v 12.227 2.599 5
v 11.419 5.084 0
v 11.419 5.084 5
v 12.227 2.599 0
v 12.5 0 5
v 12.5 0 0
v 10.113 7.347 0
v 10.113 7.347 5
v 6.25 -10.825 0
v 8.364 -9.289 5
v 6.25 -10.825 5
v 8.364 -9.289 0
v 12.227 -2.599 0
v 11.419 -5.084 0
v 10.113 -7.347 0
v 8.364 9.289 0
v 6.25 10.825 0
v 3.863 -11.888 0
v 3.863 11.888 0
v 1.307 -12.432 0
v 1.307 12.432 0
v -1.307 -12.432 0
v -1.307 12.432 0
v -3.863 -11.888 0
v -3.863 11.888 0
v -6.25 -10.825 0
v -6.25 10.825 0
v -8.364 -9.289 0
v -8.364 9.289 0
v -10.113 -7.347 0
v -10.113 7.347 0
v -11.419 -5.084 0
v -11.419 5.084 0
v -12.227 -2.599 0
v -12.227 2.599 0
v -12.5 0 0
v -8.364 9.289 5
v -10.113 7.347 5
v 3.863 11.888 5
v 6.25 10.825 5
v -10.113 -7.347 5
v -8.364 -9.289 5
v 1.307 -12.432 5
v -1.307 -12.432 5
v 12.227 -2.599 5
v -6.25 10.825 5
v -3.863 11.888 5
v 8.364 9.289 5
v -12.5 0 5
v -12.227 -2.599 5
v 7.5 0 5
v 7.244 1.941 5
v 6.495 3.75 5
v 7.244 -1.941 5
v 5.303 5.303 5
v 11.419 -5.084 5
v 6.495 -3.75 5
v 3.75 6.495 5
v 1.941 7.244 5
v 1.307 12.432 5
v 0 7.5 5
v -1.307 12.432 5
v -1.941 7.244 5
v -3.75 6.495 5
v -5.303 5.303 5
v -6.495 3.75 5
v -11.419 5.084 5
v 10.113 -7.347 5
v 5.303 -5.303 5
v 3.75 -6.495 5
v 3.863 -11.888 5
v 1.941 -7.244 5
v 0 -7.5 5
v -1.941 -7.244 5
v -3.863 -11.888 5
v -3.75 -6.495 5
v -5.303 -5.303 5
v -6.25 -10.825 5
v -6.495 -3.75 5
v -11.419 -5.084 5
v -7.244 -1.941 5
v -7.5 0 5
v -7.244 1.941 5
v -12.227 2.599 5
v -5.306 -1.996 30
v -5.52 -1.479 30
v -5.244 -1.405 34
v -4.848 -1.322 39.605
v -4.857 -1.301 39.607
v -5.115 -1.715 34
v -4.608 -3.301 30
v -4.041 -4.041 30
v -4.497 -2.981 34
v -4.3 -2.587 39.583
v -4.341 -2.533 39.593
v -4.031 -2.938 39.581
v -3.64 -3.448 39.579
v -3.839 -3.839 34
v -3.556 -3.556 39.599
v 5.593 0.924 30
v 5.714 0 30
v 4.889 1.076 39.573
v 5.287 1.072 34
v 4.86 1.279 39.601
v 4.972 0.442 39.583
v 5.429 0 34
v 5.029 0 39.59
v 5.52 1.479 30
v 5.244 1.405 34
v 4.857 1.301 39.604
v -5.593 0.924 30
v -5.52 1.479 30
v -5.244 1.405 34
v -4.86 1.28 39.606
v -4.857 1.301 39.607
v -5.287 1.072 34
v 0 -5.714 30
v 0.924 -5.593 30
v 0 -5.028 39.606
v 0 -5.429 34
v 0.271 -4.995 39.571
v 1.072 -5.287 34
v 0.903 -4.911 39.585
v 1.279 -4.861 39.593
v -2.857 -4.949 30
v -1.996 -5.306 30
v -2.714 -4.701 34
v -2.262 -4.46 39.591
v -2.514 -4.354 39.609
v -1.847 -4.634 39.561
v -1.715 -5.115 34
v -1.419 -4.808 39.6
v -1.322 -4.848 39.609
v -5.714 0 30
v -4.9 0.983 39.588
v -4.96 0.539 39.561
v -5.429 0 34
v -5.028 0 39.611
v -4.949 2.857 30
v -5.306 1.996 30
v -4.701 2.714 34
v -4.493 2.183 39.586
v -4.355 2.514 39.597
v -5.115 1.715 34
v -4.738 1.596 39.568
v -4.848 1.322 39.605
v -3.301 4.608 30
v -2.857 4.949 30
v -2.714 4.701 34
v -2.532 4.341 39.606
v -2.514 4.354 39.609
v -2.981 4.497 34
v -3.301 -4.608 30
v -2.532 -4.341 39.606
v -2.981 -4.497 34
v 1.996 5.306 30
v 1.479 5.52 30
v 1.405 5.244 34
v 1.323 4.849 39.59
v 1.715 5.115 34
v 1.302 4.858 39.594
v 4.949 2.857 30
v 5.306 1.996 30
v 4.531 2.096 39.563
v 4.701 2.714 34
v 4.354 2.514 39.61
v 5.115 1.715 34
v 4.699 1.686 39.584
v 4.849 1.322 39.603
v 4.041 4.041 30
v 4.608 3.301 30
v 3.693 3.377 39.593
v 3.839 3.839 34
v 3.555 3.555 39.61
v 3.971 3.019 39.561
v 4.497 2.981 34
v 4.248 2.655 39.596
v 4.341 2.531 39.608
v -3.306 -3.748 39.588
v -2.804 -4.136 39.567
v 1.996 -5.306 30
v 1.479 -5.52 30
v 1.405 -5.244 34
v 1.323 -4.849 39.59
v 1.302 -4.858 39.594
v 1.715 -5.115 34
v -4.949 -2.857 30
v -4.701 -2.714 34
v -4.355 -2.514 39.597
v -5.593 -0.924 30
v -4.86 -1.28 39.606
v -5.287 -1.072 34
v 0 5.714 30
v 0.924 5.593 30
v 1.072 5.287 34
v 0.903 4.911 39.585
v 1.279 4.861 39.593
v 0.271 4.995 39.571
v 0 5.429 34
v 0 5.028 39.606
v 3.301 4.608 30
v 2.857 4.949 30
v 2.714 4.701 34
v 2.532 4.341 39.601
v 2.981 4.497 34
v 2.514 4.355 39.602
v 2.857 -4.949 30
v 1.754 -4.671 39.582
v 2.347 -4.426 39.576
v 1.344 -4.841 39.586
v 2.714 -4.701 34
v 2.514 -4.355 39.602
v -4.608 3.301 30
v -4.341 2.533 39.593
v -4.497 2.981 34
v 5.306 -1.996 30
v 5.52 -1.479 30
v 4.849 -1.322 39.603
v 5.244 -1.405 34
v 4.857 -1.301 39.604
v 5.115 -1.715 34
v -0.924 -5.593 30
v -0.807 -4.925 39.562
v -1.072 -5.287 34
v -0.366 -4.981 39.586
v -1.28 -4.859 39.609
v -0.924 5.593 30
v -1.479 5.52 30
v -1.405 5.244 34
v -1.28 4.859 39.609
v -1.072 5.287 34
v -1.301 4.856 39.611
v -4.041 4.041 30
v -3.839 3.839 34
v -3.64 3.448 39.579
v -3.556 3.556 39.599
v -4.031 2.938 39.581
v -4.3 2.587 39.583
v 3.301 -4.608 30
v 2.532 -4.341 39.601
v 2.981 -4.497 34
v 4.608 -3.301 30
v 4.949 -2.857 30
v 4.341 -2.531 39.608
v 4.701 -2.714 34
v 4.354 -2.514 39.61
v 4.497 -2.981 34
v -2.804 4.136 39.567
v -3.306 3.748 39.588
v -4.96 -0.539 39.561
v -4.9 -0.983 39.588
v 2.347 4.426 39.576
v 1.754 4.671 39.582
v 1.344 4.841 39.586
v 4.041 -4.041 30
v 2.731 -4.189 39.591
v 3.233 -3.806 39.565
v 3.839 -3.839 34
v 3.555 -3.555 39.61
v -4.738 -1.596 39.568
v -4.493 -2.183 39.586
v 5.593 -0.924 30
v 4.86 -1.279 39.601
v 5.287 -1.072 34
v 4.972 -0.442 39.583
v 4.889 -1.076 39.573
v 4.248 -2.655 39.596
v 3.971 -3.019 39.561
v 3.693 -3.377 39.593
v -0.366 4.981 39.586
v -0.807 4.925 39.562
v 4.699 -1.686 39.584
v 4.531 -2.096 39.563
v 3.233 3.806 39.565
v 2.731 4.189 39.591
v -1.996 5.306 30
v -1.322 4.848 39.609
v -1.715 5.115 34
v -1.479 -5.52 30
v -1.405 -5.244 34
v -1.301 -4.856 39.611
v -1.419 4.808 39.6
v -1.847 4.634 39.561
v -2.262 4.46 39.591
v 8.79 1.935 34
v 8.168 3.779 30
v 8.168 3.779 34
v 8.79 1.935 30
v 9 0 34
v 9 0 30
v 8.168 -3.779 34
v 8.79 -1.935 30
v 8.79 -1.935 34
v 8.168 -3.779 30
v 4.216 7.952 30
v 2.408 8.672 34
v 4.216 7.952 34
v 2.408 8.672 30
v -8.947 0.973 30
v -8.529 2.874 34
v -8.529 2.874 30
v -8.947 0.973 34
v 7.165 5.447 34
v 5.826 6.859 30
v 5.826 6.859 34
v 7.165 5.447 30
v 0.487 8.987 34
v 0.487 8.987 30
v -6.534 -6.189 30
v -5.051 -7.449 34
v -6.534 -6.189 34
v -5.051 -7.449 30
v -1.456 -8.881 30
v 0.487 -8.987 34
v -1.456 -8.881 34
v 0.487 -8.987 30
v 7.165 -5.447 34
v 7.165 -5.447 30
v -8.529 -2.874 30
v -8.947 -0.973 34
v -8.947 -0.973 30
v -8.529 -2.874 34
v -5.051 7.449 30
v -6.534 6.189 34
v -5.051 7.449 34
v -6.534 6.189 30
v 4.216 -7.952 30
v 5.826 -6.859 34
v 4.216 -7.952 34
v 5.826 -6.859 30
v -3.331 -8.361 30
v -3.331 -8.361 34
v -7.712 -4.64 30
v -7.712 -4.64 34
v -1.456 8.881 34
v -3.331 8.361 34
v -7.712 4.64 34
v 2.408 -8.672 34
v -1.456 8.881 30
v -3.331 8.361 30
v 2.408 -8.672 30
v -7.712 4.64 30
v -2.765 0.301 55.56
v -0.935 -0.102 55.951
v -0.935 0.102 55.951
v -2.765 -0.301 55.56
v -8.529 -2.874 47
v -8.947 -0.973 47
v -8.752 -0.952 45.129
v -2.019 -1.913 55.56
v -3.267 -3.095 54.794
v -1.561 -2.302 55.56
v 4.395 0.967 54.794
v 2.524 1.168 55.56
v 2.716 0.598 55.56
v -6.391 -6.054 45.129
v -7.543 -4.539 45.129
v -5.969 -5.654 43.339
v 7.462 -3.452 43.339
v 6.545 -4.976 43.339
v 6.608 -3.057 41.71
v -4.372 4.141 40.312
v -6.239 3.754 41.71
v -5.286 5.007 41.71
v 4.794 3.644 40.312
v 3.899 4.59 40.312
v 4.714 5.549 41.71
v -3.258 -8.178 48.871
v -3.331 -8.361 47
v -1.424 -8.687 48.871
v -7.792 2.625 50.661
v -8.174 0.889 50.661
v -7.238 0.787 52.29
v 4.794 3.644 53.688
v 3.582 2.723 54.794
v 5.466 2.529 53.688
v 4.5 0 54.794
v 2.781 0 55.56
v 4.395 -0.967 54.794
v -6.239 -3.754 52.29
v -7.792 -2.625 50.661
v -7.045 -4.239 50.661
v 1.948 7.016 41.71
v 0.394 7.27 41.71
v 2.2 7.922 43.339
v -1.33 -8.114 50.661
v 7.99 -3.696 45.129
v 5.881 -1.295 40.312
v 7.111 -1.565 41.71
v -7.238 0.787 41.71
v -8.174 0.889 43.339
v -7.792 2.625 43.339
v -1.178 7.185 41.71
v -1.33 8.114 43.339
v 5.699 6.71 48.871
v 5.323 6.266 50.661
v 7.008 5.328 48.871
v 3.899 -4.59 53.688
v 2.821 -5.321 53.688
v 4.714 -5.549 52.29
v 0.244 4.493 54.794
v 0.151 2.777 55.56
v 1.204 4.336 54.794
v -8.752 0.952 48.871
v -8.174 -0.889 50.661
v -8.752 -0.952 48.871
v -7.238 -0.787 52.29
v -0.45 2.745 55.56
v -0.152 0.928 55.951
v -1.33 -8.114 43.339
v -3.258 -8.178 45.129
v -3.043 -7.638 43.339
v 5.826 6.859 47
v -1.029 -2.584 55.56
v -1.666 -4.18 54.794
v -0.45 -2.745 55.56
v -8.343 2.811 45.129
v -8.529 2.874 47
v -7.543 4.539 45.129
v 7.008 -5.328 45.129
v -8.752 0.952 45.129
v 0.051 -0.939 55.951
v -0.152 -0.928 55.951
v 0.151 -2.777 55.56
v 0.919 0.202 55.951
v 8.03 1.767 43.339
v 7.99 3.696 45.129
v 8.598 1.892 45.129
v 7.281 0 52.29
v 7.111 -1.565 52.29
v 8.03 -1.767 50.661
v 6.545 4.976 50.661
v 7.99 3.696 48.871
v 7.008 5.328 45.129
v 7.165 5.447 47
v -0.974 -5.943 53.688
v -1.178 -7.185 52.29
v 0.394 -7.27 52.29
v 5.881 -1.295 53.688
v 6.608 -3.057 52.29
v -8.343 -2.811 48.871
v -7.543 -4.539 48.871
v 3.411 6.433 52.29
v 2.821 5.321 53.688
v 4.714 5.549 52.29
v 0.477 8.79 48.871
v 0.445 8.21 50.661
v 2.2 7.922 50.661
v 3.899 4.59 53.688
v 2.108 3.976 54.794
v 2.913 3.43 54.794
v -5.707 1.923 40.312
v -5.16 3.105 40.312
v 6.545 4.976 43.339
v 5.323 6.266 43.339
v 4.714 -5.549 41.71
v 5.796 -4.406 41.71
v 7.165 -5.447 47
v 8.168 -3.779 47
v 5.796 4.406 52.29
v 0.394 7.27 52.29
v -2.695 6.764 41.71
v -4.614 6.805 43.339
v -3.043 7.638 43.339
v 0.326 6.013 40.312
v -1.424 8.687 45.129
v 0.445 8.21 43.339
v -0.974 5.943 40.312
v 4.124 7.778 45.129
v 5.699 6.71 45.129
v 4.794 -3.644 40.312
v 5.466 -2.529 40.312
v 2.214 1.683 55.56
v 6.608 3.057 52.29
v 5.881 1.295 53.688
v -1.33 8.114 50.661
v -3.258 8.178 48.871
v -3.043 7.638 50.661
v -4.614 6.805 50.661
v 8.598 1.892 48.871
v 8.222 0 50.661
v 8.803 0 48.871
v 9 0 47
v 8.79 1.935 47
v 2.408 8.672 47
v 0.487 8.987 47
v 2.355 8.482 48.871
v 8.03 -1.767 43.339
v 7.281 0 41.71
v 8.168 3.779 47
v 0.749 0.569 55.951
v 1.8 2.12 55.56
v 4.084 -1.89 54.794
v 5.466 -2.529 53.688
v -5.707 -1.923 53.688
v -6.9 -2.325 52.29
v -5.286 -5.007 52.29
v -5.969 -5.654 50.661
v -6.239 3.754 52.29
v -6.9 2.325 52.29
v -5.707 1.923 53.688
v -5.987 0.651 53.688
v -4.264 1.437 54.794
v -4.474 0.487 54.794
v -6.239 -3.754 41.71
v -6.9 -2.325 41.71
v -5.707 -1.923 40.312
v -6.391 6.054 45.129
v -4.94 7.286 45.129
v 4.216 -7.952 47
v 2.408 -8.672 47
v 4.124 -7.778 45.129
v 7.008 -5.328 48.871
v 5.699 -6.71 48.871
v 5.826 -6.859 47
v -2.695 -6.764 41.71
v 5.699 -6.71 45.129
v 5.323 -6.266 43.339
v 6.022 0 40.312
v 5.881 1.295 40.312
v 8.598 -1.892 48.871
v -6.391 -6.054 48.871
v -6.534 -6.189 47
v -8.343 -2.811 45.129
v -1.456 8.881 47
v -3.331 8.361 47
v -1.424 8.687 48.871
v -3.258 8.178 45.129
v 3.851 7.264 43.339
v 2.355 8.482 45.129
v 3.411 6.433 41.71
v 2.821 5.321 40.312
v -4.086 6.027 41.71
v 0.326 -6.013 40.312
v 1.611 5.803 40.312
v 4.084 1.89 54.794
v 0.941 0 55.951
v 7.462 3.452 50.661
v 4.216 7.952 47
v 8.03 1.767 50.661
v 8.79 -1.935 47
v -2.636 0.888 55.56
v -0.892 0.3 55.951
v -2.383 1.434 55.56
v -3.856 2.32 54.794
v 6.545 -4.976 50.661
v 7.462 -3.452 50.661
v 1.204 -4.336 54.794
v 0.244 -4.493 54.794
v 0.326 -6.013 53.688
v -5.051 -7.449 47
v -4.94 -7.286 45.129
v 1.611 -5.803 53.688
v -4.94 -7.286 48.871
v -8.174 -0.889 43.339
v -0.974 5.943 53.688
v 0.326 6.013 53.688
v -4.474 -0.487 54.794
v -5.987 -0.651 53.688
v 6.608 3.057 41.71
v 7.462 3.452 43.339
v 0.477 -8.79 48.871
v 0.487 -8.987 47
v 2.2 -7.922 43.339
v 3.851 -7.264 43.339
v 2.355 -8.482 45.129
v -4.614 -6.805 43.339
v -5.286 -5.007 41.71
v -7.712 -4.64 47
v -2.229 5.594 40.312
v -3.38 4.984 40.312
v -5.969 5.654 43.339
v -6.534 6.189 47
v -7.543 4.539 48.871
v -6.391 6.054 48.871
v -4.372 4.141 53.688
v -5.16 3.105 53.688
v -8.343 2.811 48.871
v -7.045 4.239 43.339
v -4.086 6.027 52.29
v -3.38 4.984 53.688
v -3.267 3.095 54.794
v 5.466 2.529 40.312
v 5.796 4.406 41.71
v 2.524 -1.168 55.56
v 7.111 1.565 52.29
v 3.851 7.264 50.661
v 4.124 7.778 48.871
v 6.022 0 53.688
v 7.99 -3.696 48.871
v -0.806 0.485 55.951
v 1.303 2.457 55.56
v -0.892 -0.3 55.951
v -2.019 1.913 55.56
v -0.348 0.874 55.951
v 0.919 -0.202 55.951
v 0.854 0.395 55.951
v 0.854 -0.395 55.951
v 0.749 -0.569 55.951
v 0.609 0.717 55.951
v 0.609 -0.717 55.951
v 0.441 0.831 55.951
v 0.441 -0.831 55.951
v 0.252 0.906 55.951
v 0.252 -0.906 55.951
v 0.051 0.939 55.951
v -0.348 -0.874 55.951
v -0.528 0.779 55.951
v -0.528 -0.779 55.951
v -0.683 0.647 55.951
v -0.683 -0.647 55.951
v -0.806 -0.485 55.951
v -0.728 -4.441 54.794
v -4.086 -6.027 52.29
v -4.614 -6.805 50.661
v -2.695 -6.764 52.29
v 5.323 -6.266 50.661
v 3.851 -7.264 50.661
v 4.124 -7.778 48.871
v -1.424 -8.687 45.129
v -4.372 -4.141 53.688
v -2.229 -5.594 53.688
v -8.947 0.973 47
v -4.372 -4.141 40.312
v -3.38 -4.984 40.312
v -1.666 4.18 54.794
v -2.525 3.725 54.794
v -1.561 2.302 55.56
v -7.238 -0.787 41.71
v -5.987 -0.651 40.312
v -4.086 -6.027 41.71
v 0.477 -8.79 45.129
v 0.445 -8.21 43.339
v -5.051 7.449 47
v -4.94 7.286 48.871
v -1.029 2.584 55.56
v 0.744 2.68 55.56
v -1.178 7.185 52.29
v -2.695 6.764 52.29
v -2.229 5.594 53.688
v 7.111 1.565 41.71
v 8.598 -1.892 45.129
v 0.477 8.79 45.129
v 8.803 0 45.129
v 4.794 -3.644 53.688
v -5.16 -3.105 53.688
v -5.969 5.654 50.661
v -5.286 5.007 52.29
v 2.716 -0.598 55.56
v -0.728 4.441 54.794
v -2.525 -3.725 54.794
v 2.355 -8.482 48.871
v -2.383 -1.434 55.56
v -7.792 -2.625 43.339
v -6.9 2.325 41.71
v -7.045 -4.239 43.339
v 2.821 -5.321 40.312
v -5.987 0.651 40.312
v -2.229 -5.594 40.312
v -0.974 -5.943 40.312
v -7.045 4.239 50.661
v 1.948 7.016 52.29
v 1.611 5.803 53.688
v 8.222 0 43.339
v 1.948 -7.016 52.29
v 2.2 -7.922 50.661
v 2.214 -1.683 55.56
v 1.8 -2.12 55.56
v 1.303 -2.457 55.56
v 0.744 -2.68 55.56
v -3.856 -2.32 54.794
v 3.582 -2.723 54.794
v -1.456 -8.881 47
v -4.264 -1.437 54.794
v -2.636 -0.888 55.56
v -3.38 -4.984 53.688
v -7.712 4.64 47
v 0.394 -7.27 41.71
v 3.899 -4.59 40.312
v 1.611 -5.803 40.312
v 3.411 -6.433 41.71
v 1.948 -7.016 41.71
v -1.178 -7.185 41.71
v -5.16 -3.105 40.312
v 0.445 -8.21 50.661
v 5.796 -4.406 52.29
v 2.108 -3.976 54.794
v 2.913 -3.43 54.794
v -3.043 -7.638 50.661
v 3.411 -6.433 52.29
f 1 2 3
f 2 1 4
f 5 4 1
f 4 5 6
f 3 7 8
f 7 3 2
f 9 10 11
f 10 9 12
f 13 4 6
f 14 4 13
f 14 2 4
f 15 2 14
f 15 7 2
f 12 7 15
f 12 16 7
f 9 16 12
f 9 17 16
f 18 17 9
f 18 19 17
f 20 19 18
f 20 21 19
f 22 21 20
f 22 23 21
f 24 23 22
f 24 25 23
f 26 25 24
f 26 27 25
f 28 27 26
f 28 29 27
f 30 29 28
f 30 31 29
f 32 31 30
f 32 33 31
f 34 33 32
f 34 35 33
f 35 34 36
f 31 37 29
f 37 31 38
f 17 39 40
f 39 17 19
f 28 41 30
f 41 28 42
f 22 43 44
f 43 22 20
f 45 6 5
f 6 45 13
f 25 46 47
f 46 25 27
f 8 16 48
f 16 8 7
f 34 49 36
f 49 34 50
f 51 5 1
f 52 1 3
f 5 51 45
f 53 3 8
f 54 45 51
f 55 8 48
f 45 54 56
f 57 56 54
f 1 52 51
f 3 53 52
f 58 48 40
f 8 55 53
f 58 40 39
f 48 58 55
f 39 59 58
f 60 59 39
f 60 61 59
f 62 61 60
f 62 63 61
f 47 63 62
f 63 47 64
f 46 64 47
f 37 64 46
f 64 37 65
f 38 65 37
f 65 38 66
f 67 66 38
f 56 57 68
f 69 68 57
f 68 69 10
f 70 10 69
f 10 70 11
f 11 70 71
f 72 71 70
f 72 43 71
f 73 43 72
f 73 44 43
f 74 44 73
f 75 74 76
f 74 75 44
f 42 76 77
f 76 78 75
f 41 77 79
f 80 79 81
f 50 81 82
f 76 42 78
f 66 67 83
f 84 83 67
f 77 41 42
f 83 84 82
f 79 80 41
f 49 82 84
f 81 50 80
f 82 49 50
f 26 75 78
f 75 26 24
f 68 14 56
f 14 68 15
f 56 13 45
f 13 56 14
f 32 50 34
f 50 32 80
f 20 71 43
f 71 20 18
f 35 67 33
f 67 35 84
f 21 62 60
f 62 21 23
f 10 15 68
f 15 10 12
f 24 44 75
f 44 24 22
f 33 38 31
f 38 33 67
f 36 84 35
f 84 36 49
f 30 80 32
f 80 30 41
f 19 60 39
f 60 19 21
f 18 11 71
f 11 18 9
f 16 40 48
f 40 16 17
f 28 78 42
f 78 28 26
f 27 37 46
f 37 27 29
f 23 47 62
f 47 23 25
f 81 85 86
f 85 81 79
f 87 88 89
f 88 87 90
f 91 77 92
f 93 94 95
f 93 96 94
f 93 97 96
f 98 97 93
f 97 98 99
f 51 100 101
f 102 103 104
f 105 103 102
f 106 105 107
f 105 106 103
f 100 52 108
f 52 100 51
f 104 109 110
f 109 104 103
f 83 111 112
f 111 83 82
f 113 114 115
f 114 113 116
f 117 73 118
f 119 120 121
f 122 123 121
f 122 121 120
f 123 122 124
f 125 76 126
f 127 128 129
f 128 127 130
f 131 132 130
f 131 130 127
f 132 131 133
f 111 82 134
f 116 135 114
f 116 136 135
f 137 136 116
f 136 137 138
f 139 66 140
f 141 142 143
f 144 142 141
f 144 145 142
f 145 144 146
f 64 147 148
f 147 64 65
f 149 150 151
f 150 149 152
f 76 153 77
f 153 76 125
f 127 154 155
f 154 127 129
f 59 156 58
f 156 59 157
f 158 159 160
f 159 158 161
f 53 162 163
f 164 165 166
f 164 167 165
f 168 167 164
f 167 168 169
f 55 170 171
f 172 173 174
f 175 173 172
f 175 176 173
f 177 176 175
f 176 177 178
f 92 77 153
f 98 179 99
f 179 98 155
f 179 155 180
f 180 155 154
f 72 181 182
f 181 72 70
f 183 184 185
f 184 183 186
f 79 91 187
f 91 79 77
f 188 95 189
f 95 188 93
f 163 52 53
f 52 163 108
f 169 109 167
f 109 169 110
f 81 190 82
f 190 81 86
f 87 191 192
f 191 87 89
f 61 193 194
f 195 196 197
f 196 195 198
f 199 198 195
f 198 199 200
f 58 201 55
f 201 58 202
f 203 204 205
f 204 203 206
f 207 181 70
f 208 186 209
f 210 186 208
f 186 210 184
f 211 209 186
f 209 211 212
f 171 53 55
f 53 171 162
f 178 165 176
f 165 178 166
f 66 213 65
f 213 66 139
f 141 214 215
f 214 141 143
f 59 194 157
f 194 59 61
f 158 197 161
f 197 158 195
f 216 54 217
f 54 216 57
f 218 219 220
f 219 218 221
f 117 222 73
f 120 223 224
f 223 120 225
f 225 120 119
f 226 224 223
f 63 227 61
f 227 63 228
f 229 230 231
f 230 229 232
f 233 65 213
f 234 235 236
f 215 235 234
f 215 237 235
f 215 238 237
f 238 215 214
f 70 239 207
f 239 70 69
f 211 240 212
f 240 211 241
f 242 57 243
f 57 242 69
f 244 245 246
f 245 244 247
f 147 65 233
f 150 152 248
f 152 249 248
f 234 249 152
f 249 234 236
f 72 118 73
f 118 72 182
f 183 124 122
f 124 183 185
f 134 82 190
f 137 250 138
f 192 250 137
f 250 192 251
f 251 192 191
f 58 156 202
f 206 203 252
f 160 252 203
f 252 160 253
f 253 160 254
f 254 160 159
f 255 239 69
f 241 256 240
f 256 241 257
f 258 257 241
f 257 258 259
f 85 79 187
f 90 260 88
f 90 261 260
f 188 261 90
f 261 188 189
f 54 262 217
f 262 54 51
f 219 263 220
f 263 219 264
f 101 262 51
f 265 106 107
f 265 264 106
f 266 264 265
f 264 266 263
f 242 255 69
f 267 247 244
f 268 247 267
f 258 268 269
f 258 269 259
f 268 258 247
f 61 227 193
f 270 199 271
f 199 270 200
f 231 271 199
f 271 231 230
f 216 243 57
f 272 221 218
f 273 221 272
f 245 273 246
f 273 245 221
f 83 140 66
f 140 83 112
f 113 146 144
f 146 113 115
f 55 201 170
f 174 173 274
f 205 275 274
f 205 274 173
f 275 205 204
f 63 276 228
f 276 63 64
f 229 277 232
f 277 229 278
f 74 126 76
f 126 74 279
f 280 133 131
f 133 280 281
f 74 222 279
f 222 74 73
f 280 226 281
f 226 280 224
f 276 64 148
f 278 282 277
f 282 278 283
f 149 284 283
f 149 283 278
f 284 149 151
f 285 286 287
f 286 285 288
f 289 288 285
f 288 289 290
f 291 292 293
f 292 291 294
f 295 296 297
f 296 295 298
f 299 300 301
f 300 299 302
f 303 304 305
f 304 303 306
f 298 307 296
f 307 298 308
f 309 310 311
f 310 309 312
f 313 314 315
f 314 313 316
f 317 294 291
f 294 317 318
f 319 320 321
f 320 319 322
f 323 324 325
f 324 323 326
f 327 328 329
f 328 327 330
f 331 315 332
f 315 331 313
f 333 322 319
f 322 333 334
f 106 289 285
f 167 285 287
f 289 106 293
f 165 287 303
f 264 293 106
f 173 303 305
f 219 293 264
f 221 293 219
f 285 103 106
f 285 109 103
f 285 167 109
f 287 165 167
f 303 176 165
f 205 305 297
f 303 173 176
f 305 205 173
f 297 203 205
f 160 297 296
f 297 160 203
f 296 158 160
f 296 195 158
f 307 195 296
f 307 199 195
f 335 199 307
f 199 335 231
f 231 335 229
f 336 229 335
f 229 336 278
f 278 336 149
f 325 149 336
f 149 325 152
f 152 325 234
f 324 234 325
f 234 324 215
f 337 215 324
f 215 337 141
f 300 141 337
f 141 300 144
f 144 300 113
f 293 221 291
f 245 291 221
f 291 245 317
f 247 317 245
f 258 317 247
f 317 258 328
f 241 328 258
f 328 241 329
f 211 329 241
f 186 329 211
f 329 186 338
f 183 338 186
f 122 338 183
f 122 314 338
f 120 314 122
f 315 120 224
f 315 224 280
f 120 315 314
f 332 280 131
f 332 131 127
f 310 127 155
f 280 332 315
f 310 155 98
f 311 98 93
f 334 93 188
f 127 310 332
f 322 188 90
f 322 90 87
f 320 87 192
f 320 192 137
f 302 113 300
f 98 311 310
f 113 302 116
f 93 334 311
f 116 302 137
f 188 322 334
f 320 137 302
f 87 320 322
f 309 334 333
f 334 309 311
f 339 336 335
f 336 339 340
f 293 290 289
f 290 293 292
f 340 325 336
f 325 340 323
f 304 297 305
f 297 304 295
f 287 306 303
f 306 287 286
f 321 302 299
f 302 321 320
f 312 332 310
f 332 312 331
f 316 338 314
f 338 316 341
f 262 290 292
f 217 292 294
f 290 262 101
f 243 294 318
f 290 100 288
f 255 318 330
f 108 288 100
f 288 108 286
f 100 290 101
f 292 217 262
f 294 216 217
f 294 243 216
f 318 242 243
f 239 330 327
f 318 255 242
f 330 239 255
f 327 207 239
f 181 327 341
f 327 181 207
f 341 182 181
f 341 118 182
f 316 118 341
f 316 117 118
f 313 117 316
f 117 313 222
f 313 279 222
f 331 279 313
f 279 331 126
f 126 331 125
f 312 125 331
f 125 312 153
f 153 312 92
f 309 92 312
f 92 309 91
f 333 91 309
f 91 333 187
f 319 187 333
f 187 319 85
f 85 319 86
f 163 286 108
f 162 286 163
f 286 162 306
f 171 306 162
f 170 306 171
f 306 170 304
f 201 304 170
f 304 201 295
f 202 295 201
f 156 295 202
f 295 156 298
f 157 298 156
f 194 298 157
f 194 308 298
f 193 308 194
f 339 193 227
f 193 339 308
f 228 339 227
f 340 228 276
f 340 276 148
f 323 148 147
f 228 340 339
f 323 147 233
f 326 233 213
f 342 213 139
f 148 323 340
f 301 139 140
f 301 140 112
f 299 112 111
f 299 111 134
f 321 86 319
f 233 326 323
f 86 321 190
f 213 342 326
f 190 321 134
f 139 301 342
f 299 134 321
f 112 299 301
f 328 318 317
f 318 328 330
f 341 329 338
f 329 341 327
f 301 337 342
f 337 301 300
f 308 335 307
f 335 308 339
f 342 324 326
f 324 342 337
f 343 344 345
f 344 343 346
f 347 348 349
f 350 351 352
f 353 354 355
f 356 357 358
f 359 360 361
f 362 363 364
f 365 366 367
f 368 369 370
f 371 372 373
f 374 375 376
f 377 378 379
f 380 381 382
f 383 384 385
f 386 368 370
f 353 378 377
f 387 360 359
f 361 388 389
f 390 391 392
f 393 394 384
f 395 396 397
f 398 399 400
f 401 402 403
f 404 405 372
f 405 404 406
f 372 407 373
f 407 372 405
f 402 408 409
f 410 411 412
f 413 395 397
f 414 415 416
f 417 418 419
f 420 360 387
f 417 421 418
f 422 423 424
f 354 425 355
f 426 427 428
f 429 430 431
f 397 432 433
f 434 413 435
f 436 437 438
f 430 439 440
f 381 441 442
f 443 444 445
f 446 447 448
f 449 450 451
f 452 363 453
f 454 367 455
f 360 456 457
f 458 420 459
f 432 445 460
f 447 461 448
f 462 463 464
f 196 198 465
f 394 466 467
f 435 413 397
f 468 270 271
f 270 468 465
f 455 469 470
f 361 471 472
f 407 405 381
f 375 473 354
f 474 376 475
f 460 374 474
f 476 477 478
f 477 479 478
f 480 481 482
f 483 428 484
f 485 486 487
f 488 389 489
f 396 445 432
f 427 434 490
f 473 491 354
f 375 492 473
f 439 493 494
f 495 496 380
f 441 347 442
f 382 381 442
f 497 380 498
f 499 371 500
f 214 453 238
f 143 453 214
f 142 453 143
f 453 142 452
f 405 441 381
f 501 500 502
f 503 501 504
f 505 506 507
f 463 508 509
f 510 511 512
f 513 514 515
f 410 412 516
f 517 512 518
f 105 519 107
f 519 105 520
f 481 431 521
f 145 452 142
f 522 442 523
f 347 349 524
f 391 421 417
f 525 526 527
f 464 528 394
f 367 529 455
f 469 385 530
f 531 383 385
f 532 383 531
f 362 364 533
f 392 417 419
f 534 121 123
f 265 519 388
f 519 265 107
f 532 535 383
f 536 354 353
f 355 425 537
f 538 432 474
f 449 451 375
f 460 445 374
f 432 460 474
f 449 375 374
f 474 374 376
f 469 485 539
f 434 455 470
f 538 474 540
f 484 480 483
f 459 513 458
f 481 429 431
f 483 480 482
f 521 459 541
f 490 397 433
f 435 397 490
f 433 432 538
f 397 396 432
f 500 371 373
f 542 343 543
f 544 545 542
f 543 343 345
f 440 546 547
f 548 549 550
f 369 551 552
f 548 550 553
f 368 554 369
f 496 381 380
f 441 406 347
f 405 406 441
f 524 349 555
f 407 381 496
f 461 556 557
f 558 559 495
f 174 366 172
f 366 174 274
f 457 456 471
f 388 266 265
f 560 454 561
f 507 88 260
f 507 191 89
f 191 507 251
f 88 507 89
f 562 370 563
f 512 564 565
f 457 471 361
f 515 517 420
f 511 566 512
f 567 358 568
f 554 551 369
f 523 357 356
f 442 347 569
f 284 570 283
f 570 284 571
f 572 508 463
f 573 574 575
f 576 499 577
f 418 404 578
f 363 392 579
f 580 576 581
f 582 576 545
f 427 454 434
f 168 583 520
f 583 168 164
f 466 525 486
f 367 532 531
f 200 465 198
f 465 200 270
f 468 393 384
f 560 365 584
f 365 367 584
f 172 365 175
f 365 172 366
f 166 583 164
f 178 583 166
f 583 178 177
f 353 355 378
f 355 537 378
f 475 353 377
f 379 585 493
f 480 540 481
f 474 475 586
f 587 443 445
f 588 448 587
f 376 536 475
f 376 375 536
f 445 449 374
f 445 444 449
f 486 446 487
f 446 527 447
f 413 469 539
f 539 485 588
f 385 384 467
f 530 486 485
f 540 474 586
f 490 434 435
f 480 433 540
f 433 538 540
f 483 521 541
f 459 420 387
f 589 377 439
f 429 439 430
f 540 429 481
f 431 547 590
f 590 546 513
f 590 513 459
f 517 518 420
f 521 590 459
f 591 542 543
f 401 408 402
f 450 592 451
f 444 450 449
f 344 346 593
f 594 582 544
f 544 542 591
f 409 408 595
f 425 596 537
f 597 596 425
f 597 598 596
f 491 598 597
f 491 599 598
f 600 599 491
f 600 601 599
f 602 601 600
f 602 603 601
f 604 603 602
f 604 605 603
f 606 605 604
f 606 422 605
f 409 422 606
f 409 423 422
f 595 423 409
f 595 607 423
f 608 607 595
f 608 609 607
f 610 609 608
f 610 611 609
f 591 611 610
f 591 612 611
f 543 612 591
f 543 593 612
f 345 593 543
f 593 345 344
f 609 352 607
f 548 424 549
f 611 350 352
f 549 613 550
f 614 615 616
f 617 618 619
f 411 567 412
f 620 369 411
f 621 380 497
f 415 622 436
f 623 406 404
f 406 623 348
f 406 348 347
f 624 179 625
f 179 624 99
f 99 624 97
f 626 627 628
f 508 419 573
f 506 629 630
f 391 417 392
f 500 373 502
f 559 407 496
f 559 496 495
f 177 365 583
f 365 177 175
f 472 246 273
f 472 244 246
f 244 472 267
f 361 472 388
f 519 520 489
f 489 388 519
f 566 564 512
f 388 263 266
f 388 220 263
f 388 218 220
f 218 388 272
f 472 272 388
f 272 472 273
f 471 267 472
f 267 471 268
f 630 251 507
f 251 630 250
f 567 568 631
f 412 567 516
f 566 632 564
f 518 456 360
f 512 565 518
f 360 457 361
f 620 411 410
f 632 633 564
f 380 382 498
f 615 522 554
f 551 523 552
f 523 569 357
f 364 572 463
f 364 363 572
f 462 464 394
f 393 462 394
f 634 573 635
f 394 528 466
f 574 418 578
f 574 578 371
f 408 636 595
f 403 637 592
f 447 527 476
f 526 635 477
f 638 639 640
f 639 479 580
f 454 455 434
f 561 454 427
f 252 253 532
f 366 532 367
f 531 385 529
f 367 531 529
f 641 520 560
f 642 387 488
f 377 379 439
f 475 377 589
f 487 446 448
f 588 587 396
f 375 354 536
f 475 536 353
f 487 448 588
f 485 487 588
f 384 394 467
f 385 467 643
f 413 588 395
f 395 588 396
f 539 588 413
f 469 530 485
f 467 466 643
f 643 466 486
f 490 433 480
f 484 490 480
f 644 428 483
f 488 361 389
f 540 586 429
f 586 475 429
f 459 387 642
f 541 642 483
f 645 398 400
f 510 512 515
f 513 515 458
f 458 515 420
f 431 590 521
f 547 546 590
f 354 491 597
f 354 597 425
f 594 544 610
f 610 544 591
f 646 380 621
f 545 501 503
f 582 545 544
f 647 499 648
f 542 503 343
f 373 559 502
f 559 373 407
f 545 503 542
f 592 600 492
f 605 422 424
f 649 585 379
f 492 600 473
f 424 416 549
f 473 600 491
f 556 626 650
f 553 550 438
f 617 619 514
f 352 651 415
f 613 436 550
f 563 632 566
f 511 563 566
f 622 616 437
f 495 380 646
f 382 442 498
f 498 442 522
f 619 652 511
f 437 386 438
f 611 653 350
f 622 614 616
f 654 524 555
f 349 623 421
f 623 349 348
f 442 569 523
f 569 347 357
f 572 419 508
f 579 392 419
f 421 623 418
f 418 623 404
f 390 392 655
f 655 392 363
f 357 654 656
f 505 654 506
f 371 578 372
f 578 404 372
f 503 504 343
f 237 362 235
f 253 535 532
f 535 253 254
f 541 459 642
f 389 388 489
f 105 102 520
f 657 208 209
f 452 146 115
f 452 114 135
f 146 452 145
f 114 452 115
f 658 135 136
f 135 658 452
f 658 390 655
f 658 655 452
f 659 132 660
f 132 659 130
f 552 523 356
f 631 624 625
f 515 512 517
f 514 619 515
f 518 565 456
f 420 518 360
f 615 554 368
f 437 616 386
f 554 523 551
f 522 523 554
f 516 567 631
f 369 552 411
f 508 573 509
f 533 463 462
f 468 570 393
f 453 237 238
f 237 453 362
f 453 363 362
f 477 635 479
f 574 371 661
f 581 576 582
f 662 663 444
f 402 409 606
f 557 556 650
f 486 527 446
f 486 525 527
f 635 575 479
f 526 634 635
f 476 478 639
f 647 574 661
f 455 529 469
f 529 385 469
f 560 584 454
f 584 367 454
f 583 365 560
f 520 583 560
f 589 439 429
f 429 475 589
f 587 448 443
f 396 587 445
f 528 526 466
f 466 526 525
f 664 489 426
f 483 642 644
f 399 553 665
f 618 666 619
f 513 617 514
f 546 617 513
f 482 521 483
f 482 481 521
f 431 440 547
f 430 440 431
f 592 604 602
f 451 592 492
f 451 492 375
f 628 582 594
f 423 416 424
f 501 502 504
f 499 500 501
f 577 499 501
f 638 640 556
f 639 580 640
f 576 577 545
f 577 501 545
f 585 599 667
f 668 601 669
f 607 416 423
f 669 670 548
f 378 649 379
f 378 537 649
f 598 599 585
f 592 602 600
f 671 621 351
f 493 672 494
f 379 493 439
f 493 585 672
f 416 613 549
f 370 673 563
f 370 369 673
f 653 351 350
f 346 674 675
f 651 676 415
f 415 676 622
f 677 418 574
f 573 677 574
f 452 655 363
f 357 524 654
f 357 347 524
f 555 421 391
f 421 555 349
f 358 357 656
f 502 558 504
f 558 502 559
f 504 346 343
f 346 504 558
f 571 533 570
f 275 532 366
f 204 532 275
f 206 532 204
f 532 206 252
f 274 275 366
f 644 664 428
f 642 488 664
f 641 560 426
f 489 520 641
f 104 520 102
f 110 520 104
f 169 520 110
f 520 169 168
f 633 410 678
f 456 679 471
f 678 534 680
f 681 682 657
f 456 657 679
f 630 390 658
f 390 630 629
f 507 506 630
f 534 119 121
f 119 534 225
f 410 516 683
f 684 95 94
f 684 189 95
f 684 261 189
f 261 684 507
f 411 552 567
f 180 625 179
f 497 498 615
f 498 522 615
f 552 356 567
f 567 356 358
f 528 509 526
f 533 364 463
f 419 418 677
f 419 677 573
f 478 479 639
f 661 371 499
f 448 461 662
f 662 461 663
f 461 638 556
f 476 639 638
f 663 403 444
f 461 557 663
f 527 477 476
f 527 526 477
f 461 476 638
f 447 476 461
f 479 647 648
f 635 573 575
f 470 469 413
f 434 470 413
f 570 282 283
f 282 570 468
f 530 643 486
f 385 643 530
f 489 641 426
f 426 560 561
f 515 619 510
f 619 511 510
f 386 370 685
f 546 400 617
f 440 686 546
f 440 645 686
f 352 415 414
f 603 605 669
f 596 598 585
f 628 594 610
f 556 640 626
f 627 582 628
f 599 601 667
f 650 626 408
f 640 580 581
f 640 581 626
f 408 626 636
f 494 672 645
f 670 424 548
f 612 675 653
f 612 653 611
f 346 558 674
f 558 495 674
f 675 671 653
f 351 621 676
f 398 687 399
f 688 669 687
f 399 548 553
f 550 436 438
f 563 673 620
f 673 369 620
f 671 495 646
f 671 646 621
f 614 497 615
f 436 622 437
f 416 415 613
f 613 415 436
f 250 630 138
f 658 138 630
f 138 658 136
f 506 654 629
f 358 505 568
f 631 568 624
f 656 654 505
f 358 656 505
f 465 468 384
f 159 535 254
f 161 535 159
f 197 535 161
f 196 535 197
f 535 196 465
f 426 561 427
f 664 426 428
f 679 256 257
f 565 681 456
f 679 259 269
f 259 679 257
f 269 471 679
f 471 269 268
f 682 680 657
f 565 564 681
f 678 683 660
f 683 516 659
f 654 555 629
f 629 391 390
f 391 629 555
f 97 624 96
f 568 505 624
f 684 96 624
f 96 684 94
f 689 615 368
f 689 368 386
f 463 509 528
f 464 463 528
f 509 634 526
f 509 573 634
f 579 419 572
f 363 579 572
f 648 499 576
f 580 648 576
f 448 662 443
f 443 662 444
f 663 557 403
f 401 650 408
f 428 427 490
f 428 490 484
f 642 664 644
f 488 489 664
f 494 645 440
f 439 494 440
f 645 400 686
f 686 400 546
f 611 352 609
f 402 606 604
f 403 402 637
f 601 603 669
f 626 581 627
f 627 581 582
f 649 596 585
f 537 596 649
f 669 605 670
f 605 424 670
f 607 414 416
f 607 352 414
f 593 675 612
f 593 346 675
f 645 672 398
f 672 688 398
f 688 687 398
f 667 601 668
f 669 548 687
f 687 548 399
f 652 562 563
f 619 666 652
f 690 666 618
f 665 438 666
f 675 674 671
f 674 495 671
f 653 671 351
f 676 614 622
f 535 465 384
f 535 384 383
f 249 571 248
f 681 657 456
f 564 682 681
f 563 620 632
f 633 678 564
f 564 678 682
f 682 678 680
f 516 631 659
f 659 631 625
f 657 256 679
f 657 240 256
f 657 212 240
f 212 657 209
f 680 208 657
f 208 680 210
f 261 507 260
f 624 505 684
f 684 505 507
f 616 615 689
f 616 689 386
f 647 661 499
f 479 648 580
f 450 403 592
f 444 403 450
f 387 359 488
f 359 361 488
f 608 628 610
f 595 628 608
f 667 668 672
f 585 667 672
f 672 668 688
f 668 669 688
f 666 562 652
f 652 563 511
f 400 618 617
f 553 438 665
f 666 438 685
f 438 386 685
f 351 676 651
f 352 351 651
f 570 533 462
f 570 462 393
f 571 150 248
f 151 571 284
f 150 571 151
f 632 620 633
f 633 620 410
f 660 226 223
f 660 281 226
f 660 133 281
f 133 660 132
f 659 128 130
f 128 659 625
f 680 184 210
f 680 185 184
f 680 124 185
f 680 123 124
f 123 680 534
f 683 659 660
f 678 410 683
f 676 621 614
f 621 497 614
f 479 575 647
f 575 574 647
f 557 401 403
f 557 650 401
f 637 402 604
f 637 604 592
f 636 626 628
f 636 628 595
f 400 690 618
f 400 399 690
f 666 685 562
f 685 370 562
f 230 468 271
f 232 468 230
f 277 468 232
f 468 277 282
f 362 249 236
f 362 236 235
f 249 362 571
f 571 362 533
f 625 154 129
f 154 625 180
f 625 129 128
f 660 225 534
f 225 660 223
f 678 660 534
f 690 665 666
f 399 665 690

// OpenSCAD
// A model of a (somewhat crude) chess pawn.

// Dimensions of the base, the body, the collar, and the head.

baseDiameter = 25;
baseHeight = 5;

headDiameter = 18;

collarDiameter = 18;
collarHeight = 4;
collarAltitude = 30;

bodyBottomDiameter = 15;
bodyTopDiameter = 10;
bodyHeight = 35;

// The base.
cylinder(d=baseDiameter, h=baseHeight);

// The tapering body.
translate([0, 0, baseHeight])
cylinder(d1=bodyBottomDiameter, d2=bodyTopDiameter, h=bodyHeight);

// The "collar", partway up the body.
translate([0, 0, collarAltitude])
cylinder(d=collarDiameter, h=collarHeight);

// The head, a sphere.
translate([0, 0, baseHeight + bodyHeight + headDiameter/2 - 2])
sphere(d=headDiameter);
